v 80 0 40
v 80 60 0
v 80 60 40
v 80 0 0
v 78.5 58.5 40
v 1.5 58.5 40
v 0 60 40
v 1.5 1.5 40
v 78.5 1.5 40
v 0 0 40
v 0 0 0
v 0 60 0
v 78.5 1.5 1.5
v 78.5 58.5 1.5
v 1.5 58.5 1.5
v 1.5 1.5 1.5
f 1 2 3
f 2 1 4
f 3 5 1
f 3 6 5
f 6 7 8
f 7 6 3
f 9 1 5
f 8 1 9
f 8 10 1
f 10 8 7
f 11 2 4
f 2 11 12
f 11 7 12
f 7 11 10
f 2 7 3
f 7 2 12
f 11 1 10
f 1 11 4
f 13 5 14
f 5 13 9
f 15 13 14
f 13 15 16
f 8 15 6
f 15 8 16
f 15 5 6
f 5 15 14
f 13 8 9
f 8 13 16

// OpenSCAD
$fn = 32;

// ----------------------------------------------------------------------
// Open box: 1.5 mm walls
// ----------------------------------------------------------------------

// --- parameters (mm) ---
box_l = 80;               // outer length, X
box_w = 60;               // outer width, Y
box_h = 40;               // outer height, Z
wall = 1.5;               // wall thickness
floor = 1.5;              // floor thickness

difference() {
  cube([box_l, box_w, box_h]);
  translate([wall, wall, floor])
    cube([box_l - 2 * wall, box_w - 2 * wall, box_h]);
}
